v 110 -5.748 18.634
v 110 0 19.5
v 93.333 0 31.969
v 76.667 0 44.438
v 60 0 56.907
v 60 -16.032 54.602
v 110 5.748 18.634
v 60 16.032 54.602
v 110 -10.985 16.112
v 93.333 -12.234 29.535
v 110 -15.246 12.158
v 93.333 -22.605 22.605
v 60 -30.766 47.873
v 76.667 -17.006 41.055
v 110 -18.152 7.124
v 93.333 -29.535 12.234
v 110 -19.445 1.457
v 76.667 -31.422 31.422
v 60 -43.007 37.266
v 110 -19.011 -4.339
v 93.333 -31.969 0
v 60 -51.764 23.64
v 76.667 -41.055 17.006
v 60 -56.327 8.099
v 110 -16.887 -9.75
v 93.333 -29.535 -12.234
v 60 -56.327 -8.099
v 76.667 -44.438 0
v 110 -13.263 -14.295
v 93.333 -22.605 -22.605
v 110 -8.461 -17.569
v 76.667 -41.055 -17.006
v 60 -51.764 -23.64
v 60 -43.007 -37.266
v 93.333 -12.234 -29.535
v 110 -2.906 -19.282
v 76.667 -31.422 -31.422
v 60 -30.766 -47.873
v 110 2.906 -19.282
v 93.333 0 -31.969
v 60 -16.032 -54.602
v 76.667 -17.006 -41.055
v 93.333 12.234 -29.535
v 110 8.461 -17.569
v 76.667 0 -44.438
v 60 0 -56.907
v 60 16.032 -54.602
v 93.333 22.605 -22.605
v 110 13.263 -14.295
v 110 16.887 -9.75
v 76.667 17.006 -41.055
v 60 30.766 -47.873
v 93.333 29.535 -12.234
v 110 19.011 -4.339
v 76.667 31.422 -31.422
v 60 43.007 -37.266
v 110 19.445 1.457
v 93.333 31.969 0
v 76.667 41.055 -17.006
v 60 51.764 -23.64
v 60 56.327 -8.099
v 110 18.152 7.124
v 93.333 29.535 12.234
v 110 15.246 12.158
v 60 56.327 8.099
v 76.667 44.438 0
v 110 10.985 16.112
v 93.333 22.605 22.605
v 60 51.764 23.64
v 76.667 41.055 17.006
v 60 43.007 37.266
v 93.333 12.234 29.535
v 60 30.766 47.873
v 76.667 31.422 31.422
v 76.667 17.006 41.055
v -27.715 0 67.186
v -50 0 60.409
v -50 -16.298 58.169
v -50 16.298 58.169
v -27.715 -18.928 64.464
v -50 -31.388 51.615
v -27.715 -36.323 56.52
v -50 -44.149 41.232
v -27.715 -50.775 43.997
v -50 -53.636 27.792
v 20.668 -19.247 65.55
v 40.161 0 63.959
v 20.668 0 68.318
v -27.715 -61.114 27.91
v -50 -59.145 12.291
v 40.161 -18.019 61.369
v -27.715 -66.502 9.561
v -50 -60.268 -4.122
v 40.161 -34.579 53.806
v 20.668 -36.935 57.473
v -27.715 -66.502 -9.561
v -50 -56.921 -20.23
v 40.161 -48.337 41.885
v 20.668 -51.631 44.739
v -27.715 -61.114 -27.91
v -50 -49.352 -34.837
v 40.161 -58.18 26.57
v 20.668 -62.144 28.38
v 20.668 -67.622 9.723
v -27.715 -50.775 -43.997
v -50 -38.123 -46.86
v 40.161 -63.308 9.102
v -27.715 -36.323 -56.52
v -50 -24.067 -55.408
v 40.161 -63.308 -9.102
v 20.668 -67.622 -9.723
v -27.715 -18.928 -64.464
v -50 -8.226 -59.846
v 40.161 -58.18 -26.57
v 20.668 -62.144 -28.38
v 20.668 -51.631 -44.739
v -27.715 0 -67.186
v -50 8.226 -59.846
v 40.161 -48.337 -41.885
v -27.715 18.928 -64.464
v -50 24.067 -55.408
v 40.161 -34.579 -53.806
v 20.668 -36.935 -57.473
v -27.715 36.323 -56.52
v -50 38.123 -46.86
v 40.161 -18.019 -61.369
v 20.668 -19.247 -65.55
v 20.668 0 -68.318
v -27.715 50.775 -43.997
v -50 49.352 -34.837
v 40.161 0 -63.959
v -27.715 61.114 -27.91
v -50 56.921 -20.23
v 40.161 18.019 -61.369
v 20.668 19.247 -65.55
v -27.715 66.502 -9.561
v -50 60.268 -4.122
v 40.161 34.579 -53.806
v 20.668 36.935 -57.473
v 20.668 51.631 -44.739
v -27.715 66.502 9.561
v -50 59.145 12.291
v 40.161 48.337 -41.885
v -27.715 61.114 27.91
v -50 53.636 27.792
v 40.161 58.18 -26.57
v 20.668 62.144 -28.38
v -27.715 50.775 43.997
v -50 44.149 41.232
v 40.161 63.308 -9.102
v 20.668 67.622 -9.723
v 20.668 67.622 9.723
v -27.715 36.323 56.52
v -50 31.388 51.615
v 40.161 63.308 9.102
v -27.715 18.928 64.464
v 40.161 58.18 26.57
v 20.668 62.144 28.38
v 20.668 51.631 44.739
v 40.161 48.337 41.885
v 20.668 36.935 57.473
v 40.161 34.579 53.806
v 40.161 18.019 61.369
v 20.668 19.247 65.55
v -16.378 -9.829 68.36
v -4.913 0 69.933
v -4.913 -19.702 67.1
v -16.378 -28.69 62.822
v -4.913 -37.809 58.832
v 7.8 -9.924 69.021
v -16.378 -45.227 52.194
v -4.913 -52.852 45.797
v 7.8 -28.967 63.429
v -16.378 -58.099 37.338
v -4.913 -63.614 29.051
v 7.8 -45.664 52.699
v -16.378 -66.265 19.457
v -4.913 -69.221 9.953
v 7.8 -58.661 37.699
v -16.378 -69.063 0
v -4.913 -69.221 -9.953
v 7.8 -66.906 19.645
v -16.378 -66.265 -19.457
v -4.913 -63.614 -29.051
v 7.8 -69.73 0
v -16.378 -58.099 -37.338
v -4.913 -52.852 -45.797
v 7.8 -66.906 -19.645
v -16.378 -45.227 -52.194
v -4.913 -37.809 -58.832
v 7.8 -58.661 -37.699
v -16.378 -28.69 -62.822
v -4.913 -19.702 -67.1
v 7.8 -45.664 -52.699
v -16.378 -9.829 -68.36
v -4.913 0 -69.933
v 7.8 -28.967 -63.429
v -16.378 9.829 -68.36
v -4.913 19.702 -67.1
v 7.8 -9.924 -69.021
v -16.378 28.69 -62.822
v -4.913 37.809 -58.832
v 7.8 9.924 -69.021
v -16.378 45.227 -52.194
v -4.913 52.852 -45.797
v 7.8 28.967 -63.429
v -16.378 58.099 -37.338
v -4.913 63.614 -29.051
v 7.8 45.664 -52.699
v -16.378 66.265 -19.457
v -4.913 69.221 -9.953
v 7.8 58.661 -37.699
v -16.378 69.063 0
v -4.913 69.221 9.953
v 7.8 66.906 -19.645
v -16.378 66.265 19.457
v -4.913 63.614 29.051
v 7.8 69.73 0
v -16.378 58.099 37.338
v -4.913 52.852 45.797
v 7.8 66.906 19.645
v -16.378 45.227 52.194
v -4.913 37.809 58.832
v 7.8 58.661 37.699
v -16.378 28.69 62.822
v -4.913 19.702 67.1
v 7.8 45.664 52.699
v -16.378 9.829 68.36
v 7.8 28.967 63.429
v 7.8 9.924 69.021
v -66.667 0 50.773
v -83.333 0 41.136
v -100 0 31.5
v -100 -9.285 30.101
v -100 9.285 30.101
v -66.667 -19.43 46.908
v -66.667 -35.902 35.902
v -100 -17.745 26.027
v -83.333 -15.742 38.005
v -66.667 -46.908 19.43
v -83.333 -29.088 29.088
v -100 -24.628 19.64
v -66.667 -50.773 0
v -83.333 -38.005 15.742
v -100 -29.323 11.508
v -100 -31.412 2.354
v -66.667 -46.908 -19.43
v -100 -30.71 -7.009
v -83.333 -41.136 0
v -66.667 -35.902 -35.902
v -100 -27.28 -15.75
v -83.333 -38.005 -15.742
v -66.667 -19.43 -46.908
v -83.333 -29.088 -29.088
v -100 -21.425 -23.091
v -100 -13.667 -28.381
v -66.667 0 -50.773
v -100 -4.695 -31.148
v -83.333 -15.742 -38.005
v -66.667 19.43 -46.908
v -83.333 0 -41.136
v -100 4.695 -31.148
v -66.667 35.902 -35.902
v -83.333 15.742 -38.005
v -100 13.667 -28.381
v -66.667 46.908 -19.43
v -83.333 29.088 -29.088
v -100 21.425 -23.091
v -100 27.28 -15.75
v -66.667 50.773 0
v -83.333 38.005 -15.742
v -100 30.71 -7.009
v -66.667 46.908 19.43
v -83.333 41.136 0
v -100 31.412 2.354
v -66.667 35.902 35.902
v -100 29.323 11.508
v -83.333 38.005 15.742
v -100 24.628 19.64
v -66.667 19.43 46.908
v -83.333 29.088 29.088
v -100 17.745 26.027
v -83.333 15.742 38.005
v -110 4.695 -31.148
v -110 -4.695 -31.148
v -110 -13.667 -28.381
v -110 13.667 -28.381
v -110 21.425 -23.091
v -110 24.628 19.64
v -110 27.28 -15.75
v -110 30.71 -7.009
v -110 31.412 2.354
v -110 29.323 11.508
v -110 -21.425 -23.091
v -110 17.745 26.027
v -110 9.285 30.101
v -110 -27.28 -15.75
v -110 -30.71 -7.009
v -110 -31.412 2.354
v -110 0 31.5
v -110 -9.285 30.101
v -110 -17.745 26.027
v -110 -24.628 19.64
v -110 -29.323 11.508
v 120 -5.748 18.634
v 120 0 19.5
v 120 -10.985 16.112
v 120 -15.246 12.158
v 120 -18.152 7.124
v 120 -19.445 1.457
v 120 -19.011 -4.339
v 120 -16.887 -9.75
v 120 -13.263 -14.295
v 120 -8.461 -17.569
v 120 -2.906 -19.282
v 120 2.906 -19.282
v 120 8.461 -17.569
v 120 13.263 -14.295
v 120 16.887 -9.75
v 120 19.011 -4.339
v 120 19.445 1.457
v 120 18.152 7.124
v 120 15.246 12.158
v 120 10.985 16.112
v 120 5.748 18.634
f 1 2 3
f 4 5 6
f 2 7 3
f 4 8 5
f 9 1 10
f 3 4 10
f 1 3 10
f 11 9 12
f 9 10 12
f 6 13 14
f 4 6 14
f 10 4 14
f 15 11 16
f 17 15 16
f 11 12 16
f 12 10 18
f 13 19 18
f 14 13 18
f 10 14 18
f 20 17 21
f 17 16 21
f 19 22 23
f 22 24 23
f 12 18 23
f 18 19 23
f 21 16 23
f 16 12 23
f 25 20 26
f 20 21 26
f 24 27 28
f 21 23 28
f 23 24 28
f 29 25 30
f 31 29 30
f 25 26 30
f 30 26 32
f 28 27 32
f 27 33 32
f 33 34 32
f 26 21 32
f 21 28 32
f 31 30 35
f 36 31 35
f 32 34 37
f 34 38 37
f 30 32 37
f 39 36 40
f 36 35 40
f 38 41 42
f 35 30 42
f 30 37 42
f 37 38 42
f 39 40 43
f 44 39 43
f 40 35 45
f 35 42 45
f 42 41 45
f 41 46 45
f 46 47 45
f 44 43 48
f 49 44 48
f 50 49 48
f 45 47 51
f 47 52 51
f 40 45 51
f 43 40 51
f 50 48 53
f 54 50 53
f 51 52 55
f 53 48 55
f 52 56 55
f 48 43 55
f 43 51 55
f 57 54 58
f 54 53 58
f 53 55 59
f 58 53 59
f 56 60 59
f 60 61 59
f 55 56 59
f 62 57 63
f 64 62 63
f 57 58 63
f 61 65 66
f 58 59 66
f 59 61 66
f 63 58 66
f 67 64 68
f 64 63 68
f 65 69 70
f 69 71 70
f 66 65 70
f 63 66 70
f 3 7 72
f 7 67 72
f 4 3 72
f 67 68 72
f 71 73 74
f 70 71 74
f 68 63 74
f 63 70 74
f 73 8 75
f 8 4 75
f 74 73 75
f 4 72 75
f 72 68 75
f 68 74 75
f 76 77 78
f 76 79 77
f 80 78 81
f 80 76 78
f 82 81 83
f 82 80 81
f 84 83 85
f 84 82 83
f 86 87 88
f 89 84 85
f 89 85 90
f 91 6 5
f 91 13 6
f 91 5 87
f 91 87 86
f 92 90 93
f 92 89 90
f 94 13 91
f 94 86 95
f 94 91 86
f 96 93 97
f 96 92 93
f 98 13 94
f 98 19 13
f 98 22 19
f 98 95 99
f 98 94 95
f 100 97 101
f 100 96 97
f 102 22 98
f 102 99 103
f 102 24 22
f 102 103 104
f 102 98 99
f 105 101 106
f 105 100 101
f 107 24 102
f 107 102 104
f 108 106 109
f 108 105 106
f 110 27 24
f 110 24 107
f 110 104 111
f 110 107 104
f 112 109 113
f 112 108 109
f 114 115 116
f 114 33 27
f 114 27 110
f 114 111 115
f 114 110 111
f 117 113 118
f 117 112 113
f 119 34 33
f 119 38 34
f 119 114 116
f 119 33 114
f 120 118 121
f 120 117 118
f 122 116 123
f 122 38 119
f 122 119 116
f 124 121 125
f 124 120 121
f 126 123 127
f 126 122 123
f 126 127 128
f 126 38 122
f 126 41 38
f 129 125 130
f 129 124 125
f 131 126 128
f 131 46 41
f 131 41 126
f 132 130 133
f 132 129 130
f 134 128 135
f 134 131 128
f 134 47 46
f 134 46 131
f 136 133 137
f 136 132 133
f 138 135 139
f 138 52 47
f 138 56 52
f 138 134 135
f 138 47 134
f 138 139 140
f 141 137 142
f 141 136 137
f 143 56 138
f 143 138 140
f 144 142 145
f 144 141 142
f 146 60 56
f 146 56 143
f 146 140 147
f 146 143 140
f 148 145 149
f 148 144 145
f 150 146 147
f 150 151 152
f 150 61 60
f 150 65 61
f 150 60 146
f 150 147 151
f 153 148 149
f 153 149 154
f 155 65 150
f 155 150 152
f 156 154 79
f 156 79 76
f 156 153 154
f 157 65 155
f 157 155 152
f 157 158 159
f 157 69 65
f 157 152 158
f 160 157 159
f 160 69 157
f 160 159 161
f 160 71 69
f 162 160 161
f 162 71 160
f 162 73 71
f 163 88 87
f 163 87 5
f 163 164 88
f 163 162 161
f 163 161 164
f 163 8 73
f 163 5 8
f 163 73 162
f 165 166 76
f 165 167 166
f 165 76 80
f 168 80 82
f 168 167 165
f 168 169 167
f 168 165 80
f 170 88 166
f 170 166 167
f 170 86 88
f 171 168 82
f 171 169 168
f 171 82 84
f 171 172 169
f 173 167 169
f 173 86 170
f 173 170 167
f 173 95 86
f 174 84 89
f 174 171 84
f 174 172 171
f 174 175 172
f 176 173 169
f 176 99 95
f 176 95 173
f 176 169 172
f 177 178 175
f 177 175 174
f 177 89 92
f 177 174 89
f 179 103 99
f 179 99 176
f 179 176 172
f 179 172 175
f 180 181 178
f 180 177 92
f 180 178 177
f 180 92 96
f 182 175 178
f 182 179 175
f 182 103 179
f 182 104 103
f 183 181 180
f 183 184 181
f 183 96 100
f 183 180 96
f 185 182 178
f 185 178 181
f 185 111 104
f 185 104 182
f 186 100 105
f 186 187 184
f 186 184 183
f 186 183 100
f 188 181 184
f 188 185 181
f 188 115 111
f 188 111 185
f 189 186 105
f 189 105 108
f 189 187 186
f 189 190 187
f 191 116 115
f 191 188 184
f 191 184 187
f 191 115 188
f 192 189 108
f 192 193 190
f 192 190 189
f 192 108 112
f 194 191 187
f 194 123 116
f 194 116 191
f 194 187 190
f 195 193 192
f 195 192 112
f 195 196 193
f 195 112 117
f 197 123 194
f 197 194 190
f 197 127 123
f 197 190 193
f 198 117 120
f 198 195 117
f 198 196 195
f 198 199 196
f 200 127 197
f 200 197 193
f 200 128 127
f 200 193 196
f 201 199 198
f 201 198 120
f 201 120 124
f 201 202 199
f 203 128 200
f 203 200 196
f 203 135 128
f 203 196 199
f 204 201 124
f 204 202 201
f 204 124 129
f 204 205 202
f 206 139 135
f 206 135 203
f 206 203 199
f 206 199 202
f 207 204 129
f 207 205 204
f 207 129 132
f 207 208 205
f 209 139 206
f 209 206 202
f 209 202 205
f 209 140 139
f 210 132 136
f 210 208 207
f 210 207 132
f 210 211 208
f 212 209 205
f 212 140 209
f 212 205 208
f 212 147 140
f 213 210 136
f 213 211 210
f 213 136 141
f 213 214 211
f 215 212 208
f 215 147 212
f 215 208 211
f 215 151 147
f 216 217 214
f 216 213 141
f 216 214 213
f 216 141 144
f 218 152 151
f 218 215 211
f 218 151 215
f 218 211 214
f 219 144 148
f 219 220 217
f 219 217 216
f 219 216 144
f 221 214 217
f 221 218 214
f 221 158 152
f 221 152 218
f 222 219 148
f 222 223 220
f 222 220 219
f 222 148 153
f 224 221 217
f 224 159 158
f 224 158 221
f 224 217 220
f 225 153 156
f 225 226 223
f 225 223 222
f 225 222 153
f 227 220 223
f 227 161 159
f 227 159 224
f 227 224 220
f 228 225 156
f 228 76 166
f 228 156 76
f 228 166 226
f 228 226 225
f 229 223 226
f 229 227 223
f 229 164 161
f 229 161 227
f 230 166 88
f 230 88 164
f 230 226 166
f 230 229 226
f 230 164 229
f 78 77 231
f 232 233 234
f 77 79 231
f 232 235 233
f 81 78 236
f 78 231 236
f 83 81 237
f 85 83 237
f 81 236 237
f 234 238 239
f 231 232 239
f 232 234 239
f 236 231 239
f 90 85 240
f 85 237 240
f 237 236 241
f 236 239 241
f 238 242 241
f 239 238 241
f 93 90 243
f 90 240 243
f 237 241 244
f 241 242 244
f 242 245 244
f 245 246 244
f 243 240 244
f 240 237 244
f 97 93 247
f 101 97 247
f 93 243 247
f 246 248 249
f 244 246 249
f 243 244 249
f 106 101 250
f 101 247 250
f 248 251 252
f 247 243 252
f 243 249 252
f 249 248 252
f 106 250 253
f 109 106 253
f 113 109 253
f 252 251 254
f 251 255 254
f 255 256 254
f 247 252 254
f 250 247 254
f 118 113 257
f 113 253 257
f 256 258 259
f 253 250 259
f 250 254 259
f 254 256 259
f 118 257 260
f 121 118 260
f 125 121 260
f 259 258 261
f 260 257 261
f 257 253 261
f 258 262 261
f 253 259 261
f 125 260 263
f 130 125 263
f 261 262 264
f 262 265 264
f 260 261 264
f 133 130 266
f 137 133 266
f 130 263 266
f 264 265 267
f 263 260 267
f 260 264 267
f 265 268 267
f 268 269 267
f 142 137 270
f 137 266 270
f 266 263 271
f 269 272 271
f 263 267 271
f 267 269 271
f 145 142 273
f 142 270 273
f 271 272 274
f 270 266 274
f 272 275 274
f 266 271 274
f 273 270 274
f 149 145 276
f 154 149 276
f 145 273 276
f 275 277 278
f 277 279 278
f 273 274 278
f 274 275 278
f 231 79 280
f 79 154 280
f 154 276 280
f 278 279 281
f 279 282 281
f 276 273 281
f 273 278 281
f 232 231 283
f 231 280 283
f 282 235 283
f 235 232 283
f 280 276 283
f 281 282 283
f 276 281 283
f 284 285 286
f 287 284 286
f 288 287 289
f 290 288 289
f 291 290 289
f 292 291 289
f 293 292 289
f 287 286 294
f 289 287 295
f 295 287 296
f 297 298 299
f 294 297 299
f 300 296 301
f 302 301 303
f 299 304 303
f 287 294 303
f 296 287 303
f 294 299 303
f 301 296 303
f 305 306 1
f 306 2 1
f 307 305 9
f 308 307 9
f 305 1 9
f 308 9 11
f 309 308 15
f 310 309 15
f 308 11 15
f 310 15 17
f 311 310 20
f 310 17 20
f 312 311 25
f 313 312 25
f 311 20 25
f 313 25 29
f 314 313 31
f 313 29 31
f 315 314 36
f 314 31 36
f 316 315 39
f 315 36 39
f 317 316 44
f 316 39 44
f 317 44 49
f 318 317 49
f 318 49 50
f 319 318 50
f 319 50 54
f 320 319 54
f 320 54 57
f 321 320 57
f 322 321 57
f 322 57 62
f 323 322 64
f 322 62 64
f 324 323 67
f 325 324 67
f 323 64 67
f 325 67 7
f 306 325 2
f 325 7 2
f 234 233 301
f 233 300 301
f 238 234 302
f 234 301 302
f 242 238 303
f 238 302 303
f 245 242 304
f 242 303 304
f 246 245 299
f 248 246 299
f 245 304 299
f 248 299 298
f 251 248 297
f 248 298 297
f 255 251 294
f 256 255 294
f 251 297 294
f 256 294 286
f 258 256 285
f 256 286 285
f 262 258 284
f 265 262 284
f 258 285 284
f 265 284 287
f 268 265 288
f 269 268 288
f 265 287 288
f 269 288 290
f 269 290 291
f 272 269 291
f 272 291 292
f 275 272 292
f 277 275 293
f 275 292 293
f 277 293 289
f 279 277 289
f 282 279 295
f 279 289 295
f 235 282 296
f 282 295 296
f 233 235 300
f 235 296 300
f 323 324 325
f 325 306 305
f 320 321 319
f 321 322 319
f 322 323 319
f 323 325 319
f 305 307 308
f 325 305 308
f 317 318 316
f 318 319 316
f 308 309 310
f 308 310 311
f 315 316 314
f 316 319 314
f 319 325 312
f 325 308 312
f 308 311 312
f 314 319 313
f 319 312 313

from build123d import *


with BuildPart() as part:
    # Sketch1 → Revolve1 (revolve)
    with BuildSketch(Plane(origin=(0, 0, 0), x_dir=(1, 0, 0), z_dir=(0, 1, 0)), mode=Mode.PRIVATE) as revolve1_sk:
        with BuildLine():
            Line((-50, 60.408992064), (-100, 31.5))
            Line((-100, 31.5), (-110, 31.5))
            Line((-110, 31.5), (-110, 0))
            Line((-110, 0), (0, 0))
            Line((0, 0), (120, 0))
            Line((120, 0), (120, 19.5))
            Line((120, 19.5), (110, 19.5))
            Line((110, 19.5), (60, 56.906674408))
            add(Edge.make_bspline(
                [(-50, 60.408992064), (2.111468829, 81.206167483), (60, 56.906674408)],
                knots=[0, 0, 0, 1, 1, 1], degree=2))
        make_face()
    revolve(revolve1_sk.sketch.rotate(Axis((-72.866242038, 0, 0), (1, 0, 0)), 180), axis=Axis((-72.866242038, 0, 0), (1, 0, 0)))


solid = part.part
